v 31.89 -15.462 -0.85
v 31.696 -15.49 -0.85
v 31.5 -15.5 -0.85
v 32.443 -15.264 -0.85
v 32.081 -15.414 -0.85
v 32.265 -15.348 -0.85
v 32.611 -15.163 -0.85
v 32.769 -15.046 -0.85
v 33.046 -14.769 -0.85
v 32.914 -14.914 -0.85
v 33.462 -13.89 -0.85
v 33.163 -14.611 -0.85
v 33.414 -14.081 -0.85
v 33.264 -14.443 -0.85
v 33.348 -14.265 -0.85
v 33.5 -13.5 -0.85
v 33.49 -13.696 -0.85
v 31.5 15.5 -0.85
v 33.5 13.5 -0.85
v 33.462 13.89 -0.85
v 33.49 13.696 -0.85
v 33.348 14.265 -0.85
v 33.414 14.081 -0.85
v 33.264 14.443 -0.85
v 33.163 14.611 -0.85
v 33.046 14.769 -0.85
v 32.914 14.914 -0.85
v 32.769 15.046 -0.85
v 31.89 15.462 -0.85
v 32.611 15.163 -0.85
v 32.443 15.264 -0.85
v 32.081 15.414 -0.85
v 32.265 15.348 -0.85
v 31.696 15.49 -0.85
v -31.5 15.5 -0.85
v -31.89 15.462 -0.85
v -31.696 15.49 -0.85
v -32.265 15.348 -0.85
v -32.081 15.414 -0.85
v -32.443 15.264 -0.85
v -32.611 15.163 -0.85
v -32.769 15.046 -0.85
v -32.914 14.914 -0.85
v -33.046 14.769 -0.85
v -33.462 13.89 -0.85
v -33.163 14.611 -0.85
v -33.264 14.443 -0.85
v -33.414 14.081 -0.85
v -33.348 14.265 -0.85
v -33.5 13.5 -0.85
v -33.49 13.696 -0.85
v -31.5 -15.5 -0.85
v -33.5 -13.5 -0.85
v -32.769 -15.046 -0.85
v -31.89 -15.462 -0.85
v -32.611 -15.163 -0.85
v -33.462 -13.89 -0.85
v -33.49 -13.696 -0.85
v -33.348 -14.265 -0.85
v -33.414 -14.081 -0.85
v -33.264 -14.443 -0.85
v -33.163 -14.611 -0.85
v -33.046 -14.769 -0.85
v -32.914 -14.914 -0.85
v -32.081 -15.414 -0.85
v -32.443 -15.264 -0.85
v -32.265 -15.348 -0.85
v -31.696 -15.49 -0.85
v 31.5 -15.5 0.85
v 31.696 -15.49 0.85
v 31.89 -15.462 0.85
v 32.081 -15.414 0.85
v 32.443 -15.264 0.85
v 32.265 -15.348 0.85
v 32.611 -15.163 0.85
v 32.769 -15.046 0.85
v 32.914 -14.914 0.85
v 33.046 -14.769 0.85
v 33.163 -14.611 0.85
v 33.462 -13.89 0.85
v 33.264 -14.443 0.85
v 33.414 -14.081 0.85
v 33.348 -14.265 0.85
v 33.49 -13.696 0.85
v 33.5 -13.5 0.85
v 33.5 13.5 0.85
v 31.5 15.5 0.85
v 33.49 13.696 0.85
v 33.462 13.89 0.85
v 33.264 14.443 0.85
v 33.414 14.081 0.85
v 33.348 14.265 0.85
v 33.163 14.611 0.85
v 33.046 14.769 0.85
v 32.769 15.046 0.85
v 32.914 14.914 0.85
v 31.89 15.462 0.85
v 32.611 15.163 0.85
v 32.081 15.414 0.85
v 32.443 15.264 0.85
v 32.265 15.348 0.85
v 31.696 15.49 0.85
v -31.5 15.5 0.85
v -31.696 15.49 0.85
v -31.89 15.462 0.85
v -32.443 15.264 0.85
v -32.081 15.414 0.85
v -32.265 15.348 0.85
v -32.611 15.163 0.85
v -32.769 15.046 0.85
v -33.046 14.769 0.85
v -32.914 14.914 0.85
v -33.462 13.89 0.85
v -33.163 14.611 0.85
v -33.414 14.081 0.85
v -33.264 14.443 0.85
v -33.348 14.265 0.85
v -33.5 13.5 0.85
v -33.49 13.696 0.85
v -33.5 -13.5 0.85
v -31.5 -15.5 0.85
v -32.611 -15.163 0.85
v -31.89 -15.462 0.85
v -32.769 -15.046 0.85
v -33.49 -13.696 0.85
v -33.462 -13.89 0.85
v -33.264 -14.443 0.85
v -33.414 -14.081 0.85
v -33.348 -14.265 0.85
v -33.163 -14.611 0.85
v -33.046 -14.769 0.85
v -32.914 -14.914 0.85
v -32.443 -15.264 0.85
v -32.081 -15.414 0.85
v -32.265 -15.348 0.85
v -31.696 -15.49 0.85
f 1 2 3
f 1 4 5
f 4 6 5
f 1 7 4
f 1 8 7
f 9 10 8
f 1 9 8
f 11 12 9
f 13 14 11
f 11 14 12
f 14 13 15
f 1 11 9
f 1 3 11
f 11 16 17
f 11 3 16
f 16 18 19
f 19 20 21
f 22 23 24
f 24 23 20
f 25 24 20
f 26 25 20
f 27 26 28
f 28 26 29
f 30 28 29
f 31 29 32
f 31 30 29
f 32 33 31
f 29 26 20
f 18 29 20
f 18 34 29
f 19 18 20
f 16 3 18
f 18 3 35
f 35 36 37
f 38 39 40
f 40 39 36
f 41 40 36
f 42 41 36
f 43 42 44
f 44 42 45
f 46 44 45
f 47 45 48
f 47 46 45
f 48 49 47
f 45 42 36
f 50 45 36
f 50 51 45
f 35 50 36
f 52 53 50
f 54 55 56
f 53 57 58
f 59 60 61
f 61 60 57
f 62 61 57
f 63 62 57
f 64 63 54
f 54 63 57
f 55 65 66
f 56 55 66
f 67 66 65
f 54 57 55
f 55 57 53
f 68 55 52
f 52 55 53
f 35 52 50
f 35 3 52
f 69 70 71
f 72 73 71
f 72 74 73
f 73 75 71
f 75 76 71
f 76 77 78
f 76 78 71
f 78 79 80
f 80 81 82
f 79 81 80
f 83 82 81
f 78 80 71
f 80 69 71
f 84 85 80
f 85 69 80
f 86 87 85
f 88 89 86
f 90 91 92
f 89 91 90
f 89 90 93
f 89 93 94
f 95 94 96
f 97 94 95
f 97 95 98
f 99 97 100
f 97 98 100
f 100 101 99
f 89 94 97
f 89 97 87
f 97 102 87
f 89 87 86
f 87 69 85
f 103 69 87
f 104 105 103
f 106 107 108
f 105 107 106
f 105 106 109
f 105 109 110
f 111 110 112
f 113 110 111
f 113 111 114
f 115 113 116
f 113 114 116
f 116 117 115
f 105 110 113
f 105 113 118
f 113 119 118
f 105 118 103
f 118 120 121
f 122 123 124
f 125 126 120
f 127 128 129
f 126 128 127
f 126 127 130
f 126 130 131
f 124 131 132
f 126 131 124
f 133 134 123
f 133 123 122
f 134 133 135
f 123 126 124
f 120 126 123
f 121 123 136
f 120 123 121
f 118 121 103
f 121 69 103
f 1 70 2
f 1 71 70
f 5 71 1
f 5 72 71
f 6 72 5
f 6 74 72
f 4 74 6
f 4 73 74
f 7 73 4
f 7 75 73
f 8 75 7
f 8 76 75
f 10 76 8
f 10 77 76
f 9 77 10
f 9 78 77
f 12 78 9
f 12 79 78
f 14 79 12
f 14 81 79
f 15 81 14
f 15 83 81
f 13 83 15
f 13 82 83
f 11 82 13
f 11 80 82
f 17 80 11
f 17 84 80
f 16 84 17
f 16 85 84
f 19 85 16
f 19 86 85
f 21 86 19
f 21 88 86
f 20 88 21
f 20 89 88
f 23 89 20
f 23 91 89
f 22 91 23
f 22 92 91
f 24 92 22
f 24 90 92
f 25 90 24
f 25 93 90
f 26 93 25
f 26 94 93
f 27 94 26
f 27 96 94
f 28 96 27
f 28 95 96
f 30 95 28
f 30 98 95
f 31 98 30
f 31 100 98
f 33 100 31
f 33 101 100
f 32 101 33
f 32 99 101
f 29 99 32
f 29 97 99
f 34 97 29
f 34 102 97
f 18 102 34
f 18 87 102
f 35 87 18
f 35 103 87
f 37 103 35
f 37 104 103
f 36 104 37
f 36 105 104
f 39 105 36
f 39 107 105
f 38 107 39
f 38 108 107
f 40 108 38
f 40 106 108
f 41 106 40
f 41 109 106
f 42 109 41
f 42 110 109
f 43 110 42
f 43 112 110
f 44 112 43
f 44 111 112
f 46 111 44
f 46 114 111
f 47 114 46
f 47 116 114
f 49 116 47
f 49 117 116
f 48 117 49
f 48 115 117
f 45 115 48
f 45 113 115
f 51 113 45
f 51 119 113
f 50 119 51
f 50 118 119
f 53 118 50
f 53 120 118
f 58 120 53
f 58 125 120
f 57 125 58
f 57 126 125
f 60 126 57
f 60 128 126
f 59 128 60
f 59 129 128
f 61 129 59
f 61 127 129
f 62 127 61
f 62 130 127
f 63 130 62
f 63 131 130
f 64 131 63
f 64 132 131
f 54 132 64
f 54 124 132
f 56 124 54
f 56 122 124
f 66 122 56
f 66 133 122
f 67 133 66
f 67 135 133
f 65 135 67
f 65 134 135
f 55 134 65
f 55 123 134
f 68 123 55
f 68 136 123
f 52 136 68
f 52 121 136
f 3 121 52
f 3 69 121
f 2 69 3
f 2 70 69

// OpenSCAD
$fn=64;

module pcb_board(len=67.0, wid=31.0, th=1.7, corner_r=2.0) {
    corner_r2 = min(corner_r, min(len, wid)/2);
    linear_extrude(height=th, center=true)
        offset(r=corner_r2)
            square([len-2*corner_r2, wid-2*corner_r2], center=true);
}

pcb_board();
